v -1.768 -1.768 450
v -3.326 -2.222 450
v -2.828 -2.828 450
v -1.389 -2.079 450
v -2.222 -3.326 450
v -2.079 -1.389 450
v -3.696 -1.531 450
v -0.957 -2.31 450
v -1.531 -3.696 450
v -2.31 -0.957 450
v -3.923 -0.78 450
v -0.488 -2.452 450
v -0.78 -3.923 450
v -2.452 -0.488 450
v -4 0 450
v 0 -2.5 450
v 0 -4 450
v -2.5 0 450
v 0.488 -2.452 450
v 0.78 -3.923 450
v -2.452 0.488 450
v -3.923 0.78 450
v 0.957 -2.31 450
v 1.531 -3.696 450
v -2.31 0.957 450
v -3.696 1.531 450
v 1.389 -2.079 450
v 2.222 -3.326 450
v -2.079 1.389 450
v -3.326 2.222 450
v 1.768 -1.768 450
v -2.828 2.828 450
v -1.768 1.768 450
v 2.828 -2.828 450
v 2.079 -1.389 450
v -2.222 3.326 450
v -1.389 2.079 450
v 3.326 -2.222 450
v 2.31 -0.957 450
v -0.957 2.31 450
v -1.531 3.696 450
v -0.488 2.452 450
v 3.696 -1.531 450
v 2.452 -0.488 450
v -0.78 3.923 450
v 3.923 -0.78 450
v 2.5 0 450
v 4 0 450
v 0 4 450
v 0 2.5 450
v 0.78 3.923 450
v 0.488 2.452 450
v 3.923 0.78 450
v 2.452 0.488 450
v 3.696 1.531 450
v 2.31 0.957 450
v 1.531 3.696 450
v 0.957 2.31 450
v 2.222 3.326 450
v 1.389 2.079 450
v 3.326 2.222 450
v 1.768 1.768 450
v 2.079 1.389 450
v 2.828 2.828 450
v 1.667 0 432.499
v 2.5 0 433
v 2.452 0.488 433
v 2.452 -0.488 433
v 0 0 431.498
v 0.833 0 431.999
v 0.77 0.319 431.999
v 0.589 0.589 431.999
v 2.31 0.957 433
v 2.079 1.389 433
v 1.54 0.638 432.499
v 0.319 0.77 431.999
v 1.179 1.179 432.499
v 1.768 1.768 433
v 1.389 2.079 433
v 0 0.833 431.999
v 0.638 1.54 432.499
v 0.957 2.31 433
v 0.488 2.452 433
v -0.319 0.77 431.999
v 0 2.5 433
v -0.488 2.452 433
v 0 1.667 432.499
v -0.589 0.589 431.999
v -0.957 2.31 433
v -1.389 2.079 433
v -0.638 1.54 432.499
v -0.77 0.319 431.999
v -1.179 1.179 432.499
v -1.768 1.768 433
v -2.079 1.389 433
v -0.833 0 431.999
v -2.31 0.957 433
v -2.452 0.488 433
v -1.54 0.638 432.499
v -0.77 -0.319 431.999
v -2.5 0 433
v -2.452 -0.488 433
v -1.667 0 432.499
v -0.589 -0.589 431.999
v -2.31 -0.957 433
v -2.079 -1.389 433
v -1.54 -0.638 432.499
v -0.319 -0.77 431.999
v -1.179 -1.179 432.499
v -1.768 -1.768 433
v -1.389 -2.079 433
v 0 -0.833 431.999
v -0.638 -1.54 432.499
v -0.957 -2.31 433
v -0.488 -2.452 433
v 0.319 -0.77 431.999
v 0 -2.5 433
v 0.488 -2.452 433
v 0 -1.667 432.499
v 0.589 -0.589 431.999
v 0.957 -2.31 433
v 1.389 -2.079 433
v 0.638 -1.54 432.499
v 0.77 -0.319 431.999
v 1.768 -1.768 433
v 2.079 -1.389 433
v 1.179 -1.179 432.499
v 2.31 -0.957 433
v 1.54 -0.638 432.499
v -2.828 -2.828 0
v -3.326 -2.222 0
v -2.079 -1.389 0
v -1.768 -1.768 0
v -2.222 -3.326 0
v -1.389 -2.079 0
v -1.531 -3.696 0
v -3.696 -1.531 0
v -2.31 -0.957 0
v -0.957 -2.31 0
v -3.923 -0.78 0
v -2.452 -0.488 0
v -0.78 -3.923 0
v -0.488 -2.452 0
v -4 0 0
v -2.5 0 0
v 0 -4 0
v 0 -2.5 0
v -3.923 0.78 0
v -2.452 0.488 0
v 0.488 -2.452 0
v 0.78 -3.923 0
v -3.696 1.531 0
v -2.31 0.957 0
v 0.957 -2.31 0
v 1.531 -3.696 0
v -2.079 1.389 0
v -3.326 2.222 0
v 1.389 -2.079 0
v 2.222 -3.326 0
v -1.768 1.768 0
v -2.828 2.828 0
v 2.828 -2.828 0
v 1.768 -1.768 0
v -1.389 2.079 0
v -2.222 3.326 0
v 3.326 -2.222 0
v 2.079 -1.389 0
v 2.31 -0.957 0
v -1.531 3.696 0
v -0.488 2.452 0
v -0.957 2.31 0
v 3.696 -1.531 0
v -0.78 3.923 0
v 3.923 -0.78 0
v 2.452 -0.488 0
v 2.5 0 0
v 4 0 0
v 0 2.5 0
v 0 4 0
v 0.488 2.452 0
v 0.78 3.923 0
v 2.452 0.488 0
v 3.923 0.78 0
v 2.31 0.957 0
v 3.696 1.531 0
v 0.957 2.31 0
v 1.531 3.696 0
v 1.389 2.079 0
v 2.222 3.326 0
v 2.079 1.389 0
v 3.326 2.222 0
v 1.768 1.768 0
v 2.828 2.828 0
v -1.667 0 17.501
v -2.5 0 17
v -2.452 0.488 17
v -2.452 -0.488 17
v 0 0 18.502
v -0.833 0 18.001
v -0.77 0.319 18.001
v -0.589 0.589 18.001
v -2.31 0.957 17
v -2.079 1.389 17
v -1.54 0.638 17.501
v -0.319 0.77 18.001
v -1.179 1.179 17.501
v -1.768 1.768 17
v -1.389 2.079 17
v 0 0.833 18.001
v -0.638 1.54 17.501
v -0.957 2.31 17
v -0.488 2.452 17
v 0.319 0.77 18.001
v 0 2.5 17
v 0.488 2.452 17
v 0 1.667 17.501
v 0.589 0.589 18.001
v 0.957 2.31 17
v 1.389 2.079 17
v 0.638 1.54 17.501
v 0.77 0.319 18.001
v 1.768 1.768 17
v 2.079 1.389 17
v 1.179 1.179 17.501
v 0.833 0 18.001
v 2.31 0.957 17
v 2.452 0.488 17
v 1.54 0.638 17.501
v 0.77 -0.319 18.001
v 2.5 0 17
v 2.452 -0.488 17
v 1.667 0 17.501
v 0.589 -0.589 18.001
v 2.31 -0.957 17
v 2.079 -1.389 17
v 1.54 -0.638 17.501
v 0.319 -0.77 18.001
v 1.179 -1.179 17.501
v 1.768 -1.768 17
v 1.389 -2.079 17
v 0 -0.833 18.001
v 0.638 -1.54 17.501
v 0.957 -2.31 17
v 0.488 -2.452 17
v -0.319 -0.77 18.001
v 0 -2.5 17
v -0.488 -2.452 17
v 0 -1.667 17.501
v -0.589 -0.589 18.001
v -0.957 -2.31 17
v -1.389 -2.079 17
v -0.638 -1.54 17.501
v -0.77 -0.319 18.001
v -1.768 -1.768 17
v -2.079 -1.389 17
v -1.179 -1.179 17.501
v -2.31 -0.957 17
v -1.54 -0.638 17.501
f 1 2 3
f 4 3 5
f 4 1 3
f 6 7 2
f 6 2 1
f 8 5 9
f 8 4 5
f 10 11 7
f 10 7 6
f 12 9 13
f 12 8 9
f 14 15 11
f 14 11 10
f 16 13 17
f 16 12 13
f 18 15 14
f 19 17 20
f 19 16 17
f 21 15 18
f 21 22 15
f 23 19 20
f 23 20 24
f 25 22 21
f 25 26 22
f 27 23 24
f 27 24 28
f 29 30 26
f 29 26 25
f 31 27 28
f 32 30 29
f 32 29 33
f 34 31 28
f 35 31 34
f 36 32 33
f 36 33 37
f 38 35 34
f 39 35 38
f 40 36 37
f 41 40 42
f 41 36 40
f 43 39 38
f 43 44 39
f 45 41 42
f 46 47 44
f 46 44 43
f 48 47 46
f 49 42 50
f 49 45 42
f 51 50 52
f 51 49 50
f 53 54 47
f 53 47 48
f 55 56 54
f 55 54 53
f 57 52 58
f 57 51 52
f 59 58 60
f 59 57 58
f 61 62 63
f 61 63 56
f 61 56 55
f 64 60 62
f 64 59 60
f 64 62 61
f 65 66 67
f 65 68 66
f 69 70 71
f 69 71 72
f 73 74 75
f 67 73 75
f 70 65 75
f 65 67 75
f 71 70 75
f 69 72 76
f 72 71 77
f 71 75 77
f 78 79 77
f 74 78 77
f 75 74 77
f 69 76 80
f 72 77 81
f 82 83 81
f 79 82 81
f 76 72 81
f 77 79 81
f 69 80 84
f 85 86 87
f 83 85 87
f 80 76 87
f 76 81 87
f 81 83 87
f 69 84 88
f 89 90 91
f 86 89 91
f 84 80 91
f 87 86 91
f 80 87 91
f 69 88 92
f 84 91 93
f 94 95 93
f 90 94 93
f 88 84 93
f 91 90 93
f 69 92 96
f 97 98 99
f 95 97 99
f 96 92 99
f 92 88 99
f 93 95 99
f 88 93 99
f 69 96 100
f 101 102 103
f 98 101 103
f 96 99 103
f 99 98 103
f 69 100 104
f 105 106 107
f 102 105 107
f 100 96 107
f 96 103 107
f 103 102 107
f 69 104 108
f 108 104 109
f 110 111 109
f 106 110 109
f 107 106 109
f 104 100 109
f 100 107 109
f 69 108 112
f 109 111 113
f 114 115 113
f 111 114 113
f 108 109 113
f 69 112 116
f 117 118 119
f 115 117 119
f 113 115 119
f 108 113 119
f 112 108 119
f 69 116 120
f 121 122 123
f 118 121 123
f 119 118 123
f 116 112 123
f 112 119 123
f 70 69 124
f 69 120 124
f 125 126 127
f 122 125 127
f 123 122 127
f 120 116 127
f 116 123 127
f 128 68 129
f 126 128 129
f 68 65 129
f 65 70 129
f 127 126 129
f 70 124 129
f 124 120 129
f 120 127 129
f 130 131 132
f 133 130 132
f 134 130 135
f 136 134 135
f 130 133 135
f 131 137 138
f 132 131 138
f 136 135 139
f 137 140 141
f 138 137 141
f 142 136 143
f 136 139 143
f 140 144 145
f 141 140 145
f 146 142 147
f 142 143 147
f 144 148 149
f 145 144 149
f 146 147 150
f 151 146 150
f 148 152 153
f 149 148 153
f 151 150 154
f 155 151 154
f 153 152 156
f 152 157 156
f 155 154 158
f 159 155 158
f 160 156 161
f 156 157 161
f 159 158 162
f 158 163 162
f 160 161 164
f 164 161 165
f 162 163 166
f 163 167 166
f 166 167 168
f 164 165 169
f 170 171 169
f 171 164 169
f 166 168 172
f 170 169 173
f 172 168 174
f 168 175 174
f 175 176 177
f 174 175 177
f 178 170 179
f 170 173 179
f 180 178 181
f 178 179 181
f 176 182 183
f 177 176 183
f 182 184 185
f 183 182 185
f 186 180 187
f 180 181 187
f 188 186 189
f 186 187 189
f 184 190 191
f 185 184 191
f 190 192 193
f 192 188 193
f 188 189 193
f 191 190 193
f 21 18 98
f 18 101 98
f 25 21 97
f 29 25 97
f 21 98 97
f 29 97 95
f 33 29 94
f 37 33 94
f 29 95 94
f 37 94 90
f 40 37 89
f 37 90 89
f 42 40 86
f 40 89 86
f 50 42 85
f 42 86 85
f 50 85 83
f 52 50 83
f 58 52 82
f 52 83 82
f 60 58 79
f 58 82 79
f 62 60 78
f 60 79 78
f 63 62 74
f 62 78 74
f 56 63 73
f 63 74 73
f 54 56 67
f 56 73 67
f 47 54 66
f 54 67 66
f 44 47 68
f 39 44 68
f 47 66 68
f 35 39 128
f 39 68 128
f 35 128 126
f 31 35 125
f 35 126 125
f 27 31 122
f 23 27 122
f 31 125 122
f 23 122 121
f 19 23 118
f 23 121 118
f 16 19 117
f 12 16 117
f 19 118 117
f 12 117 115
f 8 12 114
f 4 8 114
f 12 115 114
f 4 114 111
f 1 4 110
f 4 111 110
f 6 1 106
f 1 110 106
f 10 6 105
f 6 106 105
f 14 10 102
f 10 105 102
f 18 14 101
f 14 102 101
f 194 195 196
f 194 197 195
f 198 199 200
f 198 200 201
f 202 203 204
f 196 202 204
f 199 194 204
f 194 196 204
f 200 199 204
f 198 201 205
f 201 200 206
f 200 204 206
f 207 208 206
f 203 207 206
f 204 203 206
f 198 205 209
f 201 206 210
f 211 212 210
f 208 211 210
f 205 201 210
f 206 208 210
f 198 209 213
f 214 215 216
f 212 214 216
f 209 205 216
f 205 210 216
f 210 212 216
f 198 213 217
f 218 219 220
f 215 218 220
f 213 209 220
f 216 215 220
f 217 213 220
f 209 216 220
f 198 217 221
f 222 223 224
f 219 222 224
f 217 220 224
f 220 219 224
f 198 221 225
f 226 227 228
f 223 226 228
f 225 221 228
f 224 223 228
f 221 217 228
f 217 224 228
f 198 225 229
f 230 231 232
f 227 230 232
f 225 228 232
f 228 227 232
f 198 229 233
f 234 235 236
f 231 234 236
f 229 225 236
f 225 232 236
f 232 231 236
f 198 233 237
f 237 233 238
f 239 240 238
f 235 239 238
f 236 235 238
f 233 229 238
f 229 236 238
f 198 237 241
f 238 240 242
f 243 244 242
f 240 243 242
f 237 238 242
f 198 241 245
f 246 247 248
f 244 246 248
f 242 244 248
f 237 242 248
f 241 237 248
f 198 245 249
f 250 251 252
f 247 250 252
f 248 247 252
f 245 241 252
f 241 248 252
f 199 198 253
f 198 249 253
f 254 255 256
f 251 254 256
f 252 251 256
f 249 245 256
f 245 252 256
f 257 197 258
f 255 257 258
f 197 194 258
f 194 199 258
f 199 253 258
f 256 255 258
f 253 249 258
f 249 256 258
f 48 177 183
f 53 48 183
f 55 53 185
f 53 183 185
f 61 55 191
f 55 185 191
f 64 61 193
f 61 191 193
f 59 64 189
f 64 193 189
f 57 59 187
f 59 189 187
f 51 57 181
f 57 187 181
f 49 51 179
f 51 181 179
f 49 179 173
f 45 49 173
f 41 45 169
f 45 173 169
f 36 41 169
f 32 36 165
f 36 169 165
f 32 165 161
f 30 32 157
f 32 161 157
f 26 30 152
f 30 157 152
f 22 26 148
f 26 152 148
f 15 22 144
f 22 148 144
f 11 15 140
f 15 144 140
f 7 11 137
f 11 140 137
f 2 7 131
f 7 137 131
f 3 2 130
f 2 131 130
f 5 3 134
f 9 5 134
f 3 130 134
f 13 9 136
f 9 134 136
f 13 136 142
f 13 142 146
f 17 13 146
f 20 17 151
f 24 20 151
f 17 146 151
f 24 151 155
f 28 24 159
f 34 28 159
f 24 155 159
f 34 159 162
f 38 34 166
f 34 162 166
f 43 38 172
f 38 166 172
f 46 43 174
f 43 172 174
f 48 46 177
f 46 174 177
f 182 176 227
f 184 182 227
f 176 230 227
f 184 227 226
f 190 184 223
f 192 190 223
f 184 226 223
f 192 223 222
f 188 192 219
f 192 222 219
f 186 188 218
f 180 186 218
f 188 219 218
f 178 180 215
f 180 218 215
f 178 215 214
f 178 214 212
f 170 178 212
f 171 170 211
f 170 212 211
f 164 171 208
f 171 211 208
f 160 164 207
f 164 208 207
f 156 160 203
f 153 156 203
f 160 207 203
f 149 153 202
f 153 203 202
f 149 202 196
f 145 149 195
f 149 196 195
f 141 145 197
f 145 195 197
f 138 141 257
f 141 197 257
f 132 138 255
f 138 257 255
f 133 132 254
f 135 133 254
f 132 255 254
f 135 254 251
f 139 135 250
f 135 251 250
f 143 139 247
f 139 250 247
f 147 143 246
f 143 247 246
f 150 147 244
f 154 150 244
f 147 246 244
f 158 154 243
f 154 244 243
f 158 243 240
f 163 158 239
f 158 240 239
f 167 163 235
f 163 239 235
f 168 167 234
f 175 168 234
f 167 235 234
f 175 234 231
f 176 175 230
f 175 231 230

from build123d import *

# Parameters (mm, degrees)
CROQUIS1_R                    = 4
SALIENTE_EXTRUIR1_DEPTH       = 450
TALADRO_ROSCADO_M6X1_01_D     = 5
TALADRO_ROSCADO_M6X1_01_DEPTH = 17
TALADRO_ROSCADO_M6X1_01_TIP   = 1.502151548
TALADRO_ROSCADO_M6X1_02_D     = 5
TALADRO_ROSCADO_M6X1_02_DEPTH = 17
TALADRO_ROSCADO_M6X1_02_TIP   = 1.502151548


with BuildPart() as part:
    # Croquis1 → Saliente-Extruir1 (new body)
    with BuildSketch(Plane.XY):
        Circle(CROQUIS1_R)
    extrude(amount=SALIENTE_EXTRUIR1_DEPTH)

    # Taladro roscado M6x1.01
    with Locations(Plane.XY.offset(450)):
        with Locations((0, 0)):
            Hole(TALADRO_ROSCADO_M6X1_01_D / 2, depth=TALADRO_ROSCADO_M6X1_01_DEPTH)
            with Locations((0, 0, -(TALADRO_ROSCADO_M6X1_01_DEPTH + TALADRO_ROSCADO_M6X1_01_TIP / 2))):  # 118° drill point
                Cone(0, TALADRO_ROSCADO_M6X1_01_D / 2, TALADRO_ROSCADO_M6X1_01_TIP, mode=Mode.SUBTRACT)

    # Taladro roscado M6x1.02
    with Locations(Plane(origin=(0, 0, 0), x_dir=(-1, 0, 0), z_dir=(0, 0, -1))):
        with Locations((0, 0)):
            Hole(TALADRO_ROSCADO_M6X1_02_D / 2, depth=TALADRO_ROSCADO_M6X1_02_DEPTH)
            with Locations((0, 0, -(TALADRO_ROSCADO_M6X1_02_DEPTH + TALADRO_ROSCADO_M6X1_02_TIP / 2))):  # 118° drill point
                Cone(0, TALADRO_ROSCADO_M6X1_02_D / 2, TALADRO_ROSCADO_M6X1_02_TIP, mode=Mode.SUBTRACT)


solid = part.part
